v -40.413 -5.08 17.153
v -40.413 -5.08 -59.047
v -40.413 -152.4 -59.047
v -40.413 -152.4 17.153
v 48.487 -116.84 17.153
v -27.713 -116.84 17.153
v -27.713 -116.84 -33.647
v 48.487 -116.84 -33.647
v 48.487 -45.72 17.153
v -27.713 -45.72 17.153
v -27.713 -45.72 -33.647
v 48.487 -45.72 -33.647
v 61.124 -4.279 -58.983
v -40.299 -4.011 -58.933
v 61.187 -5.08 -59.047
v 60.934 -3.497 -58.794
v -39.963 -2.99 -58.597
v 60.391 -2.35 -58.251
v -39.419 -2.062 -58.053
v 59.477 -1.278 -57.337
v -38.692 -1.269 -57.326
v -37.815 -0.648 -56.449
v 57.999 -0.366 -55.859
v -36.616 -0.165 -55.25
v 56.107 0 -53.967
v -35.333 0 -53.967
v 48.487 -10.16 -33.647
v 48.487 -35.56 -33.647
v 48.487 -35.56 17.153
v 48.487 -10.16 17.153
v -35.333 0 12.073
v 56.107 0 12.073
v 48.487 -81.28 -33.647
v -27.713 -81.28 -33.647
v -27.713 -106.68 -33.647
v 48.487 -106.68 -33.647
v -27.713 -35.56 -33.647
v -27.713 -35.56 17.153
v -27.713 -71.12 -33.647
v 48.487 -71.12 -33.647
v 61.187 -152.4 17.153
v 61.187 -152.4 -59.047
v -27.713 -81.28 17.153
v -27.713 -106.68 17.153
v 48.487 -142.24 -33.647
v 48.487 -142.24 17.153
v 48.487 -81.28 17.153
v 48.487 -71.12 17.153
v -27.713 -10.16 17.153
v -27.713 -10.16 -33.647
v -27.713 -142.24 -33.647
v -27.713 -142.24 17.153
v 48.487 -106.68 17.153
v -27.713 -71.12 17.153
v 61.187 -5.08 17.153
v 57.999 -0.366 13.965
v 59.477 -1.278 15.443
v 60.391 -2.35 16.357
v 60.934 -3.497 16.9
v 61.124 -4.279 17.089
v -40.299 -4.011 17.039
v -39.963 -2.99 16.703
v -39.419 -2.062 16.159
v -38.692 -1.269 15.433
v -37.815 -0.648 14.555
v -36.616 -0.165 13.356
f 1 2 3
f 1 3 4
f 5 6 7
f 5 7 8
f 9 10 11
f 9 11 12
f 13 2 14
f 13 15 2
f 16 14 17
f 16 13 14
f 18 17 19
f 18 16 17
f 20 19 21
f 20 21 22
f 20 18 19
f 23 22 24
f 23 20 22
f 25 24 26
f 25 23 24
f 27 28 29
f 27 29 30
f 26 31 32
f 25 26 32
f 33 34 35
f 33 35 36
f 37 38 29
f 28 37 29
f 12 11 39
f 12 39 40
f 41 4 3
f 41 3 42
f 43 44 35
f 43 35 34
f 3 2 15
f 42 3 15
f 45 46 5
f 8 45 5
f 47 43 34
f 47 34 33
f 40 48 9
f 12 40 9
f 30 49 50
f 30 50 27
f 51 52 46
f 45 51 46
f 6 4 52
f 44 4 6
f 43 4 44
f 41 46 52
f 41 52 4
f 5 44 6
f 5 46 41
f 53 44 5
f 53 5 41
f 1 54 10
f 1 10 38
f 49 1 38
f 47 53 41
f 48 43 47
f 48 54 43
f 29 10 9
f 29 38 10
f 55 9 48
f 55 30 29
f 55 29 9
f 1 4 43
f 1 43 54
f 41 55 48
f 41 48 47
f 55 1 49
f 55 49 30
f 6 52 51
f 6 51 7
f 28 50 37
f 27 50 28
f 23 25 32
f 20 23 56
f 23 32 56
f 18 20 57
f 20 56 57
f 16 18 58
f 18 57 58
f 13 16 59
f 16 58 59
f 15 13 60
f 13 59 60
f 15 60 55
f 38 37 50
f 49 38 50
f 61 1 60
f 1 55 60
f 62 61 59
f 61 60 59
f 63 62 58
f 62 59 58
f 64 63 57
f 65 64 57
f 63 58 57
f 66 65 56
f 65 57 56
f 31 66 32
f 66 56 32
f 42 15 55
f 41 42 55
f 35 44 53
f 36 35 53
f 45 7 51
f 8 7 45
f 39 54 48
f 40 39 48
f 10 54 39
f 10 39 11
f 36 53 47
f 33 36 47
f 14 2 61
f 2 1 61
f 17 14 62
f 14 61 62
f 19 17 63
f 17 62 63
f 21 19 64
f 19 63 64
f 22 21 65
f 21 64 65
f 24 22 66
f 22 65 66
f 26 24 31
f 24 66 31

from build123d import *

# Parameters (mm, degrees)
F0_W     = 101.6
F0_H     = 76.2
F1_DEPTH = 152.4
F2_W     = 76.2
F2_H     = 25.4
F3_DEPTH = 50.8
F4_R     = 5.08


with BuildPart() as f1:
    # F0 (on Front) → F1 (new body)
    with BuildSketch(Plane.XZ):
        with Locations((10.387156, -20.946899)):
            Rectangle(F0_W, F0_H)
    extrude(amount=F1_DEPTH)

    # F2 (on face) → F3 (cut)
    with BuildSketch(Plane.XY.offset(17.153101)):
        with Locations((10.387156, -22.86)):
            Rectangle(F2_W, F2_H)
        with Locations((10.387156, -58.42)):
            Rectangle(F2_W, F2_H)
        with Locations((10.387156, -93.98)):
            Rectangle(F2_W, F2_H)
        with Locations((10.387156, -129.54)):
            Rectangle(F2_W, F2_H)
    extrude(amount=-F3_DEPTH, mode=Mode.SUBTRACT)

    # F4
    f4_edges = [f1.edges().sort_by_distance(p)[0] for p in [
        (61.187156, 0, -20.946899),
        (10.387156, 0, -59.046899),
        (10.387156, 0, 17.153101),
        (-40.412844, 0, -20.946899),
    ]]
    fillet(f4_edges, radius=F4_R)


solid = f1.part
